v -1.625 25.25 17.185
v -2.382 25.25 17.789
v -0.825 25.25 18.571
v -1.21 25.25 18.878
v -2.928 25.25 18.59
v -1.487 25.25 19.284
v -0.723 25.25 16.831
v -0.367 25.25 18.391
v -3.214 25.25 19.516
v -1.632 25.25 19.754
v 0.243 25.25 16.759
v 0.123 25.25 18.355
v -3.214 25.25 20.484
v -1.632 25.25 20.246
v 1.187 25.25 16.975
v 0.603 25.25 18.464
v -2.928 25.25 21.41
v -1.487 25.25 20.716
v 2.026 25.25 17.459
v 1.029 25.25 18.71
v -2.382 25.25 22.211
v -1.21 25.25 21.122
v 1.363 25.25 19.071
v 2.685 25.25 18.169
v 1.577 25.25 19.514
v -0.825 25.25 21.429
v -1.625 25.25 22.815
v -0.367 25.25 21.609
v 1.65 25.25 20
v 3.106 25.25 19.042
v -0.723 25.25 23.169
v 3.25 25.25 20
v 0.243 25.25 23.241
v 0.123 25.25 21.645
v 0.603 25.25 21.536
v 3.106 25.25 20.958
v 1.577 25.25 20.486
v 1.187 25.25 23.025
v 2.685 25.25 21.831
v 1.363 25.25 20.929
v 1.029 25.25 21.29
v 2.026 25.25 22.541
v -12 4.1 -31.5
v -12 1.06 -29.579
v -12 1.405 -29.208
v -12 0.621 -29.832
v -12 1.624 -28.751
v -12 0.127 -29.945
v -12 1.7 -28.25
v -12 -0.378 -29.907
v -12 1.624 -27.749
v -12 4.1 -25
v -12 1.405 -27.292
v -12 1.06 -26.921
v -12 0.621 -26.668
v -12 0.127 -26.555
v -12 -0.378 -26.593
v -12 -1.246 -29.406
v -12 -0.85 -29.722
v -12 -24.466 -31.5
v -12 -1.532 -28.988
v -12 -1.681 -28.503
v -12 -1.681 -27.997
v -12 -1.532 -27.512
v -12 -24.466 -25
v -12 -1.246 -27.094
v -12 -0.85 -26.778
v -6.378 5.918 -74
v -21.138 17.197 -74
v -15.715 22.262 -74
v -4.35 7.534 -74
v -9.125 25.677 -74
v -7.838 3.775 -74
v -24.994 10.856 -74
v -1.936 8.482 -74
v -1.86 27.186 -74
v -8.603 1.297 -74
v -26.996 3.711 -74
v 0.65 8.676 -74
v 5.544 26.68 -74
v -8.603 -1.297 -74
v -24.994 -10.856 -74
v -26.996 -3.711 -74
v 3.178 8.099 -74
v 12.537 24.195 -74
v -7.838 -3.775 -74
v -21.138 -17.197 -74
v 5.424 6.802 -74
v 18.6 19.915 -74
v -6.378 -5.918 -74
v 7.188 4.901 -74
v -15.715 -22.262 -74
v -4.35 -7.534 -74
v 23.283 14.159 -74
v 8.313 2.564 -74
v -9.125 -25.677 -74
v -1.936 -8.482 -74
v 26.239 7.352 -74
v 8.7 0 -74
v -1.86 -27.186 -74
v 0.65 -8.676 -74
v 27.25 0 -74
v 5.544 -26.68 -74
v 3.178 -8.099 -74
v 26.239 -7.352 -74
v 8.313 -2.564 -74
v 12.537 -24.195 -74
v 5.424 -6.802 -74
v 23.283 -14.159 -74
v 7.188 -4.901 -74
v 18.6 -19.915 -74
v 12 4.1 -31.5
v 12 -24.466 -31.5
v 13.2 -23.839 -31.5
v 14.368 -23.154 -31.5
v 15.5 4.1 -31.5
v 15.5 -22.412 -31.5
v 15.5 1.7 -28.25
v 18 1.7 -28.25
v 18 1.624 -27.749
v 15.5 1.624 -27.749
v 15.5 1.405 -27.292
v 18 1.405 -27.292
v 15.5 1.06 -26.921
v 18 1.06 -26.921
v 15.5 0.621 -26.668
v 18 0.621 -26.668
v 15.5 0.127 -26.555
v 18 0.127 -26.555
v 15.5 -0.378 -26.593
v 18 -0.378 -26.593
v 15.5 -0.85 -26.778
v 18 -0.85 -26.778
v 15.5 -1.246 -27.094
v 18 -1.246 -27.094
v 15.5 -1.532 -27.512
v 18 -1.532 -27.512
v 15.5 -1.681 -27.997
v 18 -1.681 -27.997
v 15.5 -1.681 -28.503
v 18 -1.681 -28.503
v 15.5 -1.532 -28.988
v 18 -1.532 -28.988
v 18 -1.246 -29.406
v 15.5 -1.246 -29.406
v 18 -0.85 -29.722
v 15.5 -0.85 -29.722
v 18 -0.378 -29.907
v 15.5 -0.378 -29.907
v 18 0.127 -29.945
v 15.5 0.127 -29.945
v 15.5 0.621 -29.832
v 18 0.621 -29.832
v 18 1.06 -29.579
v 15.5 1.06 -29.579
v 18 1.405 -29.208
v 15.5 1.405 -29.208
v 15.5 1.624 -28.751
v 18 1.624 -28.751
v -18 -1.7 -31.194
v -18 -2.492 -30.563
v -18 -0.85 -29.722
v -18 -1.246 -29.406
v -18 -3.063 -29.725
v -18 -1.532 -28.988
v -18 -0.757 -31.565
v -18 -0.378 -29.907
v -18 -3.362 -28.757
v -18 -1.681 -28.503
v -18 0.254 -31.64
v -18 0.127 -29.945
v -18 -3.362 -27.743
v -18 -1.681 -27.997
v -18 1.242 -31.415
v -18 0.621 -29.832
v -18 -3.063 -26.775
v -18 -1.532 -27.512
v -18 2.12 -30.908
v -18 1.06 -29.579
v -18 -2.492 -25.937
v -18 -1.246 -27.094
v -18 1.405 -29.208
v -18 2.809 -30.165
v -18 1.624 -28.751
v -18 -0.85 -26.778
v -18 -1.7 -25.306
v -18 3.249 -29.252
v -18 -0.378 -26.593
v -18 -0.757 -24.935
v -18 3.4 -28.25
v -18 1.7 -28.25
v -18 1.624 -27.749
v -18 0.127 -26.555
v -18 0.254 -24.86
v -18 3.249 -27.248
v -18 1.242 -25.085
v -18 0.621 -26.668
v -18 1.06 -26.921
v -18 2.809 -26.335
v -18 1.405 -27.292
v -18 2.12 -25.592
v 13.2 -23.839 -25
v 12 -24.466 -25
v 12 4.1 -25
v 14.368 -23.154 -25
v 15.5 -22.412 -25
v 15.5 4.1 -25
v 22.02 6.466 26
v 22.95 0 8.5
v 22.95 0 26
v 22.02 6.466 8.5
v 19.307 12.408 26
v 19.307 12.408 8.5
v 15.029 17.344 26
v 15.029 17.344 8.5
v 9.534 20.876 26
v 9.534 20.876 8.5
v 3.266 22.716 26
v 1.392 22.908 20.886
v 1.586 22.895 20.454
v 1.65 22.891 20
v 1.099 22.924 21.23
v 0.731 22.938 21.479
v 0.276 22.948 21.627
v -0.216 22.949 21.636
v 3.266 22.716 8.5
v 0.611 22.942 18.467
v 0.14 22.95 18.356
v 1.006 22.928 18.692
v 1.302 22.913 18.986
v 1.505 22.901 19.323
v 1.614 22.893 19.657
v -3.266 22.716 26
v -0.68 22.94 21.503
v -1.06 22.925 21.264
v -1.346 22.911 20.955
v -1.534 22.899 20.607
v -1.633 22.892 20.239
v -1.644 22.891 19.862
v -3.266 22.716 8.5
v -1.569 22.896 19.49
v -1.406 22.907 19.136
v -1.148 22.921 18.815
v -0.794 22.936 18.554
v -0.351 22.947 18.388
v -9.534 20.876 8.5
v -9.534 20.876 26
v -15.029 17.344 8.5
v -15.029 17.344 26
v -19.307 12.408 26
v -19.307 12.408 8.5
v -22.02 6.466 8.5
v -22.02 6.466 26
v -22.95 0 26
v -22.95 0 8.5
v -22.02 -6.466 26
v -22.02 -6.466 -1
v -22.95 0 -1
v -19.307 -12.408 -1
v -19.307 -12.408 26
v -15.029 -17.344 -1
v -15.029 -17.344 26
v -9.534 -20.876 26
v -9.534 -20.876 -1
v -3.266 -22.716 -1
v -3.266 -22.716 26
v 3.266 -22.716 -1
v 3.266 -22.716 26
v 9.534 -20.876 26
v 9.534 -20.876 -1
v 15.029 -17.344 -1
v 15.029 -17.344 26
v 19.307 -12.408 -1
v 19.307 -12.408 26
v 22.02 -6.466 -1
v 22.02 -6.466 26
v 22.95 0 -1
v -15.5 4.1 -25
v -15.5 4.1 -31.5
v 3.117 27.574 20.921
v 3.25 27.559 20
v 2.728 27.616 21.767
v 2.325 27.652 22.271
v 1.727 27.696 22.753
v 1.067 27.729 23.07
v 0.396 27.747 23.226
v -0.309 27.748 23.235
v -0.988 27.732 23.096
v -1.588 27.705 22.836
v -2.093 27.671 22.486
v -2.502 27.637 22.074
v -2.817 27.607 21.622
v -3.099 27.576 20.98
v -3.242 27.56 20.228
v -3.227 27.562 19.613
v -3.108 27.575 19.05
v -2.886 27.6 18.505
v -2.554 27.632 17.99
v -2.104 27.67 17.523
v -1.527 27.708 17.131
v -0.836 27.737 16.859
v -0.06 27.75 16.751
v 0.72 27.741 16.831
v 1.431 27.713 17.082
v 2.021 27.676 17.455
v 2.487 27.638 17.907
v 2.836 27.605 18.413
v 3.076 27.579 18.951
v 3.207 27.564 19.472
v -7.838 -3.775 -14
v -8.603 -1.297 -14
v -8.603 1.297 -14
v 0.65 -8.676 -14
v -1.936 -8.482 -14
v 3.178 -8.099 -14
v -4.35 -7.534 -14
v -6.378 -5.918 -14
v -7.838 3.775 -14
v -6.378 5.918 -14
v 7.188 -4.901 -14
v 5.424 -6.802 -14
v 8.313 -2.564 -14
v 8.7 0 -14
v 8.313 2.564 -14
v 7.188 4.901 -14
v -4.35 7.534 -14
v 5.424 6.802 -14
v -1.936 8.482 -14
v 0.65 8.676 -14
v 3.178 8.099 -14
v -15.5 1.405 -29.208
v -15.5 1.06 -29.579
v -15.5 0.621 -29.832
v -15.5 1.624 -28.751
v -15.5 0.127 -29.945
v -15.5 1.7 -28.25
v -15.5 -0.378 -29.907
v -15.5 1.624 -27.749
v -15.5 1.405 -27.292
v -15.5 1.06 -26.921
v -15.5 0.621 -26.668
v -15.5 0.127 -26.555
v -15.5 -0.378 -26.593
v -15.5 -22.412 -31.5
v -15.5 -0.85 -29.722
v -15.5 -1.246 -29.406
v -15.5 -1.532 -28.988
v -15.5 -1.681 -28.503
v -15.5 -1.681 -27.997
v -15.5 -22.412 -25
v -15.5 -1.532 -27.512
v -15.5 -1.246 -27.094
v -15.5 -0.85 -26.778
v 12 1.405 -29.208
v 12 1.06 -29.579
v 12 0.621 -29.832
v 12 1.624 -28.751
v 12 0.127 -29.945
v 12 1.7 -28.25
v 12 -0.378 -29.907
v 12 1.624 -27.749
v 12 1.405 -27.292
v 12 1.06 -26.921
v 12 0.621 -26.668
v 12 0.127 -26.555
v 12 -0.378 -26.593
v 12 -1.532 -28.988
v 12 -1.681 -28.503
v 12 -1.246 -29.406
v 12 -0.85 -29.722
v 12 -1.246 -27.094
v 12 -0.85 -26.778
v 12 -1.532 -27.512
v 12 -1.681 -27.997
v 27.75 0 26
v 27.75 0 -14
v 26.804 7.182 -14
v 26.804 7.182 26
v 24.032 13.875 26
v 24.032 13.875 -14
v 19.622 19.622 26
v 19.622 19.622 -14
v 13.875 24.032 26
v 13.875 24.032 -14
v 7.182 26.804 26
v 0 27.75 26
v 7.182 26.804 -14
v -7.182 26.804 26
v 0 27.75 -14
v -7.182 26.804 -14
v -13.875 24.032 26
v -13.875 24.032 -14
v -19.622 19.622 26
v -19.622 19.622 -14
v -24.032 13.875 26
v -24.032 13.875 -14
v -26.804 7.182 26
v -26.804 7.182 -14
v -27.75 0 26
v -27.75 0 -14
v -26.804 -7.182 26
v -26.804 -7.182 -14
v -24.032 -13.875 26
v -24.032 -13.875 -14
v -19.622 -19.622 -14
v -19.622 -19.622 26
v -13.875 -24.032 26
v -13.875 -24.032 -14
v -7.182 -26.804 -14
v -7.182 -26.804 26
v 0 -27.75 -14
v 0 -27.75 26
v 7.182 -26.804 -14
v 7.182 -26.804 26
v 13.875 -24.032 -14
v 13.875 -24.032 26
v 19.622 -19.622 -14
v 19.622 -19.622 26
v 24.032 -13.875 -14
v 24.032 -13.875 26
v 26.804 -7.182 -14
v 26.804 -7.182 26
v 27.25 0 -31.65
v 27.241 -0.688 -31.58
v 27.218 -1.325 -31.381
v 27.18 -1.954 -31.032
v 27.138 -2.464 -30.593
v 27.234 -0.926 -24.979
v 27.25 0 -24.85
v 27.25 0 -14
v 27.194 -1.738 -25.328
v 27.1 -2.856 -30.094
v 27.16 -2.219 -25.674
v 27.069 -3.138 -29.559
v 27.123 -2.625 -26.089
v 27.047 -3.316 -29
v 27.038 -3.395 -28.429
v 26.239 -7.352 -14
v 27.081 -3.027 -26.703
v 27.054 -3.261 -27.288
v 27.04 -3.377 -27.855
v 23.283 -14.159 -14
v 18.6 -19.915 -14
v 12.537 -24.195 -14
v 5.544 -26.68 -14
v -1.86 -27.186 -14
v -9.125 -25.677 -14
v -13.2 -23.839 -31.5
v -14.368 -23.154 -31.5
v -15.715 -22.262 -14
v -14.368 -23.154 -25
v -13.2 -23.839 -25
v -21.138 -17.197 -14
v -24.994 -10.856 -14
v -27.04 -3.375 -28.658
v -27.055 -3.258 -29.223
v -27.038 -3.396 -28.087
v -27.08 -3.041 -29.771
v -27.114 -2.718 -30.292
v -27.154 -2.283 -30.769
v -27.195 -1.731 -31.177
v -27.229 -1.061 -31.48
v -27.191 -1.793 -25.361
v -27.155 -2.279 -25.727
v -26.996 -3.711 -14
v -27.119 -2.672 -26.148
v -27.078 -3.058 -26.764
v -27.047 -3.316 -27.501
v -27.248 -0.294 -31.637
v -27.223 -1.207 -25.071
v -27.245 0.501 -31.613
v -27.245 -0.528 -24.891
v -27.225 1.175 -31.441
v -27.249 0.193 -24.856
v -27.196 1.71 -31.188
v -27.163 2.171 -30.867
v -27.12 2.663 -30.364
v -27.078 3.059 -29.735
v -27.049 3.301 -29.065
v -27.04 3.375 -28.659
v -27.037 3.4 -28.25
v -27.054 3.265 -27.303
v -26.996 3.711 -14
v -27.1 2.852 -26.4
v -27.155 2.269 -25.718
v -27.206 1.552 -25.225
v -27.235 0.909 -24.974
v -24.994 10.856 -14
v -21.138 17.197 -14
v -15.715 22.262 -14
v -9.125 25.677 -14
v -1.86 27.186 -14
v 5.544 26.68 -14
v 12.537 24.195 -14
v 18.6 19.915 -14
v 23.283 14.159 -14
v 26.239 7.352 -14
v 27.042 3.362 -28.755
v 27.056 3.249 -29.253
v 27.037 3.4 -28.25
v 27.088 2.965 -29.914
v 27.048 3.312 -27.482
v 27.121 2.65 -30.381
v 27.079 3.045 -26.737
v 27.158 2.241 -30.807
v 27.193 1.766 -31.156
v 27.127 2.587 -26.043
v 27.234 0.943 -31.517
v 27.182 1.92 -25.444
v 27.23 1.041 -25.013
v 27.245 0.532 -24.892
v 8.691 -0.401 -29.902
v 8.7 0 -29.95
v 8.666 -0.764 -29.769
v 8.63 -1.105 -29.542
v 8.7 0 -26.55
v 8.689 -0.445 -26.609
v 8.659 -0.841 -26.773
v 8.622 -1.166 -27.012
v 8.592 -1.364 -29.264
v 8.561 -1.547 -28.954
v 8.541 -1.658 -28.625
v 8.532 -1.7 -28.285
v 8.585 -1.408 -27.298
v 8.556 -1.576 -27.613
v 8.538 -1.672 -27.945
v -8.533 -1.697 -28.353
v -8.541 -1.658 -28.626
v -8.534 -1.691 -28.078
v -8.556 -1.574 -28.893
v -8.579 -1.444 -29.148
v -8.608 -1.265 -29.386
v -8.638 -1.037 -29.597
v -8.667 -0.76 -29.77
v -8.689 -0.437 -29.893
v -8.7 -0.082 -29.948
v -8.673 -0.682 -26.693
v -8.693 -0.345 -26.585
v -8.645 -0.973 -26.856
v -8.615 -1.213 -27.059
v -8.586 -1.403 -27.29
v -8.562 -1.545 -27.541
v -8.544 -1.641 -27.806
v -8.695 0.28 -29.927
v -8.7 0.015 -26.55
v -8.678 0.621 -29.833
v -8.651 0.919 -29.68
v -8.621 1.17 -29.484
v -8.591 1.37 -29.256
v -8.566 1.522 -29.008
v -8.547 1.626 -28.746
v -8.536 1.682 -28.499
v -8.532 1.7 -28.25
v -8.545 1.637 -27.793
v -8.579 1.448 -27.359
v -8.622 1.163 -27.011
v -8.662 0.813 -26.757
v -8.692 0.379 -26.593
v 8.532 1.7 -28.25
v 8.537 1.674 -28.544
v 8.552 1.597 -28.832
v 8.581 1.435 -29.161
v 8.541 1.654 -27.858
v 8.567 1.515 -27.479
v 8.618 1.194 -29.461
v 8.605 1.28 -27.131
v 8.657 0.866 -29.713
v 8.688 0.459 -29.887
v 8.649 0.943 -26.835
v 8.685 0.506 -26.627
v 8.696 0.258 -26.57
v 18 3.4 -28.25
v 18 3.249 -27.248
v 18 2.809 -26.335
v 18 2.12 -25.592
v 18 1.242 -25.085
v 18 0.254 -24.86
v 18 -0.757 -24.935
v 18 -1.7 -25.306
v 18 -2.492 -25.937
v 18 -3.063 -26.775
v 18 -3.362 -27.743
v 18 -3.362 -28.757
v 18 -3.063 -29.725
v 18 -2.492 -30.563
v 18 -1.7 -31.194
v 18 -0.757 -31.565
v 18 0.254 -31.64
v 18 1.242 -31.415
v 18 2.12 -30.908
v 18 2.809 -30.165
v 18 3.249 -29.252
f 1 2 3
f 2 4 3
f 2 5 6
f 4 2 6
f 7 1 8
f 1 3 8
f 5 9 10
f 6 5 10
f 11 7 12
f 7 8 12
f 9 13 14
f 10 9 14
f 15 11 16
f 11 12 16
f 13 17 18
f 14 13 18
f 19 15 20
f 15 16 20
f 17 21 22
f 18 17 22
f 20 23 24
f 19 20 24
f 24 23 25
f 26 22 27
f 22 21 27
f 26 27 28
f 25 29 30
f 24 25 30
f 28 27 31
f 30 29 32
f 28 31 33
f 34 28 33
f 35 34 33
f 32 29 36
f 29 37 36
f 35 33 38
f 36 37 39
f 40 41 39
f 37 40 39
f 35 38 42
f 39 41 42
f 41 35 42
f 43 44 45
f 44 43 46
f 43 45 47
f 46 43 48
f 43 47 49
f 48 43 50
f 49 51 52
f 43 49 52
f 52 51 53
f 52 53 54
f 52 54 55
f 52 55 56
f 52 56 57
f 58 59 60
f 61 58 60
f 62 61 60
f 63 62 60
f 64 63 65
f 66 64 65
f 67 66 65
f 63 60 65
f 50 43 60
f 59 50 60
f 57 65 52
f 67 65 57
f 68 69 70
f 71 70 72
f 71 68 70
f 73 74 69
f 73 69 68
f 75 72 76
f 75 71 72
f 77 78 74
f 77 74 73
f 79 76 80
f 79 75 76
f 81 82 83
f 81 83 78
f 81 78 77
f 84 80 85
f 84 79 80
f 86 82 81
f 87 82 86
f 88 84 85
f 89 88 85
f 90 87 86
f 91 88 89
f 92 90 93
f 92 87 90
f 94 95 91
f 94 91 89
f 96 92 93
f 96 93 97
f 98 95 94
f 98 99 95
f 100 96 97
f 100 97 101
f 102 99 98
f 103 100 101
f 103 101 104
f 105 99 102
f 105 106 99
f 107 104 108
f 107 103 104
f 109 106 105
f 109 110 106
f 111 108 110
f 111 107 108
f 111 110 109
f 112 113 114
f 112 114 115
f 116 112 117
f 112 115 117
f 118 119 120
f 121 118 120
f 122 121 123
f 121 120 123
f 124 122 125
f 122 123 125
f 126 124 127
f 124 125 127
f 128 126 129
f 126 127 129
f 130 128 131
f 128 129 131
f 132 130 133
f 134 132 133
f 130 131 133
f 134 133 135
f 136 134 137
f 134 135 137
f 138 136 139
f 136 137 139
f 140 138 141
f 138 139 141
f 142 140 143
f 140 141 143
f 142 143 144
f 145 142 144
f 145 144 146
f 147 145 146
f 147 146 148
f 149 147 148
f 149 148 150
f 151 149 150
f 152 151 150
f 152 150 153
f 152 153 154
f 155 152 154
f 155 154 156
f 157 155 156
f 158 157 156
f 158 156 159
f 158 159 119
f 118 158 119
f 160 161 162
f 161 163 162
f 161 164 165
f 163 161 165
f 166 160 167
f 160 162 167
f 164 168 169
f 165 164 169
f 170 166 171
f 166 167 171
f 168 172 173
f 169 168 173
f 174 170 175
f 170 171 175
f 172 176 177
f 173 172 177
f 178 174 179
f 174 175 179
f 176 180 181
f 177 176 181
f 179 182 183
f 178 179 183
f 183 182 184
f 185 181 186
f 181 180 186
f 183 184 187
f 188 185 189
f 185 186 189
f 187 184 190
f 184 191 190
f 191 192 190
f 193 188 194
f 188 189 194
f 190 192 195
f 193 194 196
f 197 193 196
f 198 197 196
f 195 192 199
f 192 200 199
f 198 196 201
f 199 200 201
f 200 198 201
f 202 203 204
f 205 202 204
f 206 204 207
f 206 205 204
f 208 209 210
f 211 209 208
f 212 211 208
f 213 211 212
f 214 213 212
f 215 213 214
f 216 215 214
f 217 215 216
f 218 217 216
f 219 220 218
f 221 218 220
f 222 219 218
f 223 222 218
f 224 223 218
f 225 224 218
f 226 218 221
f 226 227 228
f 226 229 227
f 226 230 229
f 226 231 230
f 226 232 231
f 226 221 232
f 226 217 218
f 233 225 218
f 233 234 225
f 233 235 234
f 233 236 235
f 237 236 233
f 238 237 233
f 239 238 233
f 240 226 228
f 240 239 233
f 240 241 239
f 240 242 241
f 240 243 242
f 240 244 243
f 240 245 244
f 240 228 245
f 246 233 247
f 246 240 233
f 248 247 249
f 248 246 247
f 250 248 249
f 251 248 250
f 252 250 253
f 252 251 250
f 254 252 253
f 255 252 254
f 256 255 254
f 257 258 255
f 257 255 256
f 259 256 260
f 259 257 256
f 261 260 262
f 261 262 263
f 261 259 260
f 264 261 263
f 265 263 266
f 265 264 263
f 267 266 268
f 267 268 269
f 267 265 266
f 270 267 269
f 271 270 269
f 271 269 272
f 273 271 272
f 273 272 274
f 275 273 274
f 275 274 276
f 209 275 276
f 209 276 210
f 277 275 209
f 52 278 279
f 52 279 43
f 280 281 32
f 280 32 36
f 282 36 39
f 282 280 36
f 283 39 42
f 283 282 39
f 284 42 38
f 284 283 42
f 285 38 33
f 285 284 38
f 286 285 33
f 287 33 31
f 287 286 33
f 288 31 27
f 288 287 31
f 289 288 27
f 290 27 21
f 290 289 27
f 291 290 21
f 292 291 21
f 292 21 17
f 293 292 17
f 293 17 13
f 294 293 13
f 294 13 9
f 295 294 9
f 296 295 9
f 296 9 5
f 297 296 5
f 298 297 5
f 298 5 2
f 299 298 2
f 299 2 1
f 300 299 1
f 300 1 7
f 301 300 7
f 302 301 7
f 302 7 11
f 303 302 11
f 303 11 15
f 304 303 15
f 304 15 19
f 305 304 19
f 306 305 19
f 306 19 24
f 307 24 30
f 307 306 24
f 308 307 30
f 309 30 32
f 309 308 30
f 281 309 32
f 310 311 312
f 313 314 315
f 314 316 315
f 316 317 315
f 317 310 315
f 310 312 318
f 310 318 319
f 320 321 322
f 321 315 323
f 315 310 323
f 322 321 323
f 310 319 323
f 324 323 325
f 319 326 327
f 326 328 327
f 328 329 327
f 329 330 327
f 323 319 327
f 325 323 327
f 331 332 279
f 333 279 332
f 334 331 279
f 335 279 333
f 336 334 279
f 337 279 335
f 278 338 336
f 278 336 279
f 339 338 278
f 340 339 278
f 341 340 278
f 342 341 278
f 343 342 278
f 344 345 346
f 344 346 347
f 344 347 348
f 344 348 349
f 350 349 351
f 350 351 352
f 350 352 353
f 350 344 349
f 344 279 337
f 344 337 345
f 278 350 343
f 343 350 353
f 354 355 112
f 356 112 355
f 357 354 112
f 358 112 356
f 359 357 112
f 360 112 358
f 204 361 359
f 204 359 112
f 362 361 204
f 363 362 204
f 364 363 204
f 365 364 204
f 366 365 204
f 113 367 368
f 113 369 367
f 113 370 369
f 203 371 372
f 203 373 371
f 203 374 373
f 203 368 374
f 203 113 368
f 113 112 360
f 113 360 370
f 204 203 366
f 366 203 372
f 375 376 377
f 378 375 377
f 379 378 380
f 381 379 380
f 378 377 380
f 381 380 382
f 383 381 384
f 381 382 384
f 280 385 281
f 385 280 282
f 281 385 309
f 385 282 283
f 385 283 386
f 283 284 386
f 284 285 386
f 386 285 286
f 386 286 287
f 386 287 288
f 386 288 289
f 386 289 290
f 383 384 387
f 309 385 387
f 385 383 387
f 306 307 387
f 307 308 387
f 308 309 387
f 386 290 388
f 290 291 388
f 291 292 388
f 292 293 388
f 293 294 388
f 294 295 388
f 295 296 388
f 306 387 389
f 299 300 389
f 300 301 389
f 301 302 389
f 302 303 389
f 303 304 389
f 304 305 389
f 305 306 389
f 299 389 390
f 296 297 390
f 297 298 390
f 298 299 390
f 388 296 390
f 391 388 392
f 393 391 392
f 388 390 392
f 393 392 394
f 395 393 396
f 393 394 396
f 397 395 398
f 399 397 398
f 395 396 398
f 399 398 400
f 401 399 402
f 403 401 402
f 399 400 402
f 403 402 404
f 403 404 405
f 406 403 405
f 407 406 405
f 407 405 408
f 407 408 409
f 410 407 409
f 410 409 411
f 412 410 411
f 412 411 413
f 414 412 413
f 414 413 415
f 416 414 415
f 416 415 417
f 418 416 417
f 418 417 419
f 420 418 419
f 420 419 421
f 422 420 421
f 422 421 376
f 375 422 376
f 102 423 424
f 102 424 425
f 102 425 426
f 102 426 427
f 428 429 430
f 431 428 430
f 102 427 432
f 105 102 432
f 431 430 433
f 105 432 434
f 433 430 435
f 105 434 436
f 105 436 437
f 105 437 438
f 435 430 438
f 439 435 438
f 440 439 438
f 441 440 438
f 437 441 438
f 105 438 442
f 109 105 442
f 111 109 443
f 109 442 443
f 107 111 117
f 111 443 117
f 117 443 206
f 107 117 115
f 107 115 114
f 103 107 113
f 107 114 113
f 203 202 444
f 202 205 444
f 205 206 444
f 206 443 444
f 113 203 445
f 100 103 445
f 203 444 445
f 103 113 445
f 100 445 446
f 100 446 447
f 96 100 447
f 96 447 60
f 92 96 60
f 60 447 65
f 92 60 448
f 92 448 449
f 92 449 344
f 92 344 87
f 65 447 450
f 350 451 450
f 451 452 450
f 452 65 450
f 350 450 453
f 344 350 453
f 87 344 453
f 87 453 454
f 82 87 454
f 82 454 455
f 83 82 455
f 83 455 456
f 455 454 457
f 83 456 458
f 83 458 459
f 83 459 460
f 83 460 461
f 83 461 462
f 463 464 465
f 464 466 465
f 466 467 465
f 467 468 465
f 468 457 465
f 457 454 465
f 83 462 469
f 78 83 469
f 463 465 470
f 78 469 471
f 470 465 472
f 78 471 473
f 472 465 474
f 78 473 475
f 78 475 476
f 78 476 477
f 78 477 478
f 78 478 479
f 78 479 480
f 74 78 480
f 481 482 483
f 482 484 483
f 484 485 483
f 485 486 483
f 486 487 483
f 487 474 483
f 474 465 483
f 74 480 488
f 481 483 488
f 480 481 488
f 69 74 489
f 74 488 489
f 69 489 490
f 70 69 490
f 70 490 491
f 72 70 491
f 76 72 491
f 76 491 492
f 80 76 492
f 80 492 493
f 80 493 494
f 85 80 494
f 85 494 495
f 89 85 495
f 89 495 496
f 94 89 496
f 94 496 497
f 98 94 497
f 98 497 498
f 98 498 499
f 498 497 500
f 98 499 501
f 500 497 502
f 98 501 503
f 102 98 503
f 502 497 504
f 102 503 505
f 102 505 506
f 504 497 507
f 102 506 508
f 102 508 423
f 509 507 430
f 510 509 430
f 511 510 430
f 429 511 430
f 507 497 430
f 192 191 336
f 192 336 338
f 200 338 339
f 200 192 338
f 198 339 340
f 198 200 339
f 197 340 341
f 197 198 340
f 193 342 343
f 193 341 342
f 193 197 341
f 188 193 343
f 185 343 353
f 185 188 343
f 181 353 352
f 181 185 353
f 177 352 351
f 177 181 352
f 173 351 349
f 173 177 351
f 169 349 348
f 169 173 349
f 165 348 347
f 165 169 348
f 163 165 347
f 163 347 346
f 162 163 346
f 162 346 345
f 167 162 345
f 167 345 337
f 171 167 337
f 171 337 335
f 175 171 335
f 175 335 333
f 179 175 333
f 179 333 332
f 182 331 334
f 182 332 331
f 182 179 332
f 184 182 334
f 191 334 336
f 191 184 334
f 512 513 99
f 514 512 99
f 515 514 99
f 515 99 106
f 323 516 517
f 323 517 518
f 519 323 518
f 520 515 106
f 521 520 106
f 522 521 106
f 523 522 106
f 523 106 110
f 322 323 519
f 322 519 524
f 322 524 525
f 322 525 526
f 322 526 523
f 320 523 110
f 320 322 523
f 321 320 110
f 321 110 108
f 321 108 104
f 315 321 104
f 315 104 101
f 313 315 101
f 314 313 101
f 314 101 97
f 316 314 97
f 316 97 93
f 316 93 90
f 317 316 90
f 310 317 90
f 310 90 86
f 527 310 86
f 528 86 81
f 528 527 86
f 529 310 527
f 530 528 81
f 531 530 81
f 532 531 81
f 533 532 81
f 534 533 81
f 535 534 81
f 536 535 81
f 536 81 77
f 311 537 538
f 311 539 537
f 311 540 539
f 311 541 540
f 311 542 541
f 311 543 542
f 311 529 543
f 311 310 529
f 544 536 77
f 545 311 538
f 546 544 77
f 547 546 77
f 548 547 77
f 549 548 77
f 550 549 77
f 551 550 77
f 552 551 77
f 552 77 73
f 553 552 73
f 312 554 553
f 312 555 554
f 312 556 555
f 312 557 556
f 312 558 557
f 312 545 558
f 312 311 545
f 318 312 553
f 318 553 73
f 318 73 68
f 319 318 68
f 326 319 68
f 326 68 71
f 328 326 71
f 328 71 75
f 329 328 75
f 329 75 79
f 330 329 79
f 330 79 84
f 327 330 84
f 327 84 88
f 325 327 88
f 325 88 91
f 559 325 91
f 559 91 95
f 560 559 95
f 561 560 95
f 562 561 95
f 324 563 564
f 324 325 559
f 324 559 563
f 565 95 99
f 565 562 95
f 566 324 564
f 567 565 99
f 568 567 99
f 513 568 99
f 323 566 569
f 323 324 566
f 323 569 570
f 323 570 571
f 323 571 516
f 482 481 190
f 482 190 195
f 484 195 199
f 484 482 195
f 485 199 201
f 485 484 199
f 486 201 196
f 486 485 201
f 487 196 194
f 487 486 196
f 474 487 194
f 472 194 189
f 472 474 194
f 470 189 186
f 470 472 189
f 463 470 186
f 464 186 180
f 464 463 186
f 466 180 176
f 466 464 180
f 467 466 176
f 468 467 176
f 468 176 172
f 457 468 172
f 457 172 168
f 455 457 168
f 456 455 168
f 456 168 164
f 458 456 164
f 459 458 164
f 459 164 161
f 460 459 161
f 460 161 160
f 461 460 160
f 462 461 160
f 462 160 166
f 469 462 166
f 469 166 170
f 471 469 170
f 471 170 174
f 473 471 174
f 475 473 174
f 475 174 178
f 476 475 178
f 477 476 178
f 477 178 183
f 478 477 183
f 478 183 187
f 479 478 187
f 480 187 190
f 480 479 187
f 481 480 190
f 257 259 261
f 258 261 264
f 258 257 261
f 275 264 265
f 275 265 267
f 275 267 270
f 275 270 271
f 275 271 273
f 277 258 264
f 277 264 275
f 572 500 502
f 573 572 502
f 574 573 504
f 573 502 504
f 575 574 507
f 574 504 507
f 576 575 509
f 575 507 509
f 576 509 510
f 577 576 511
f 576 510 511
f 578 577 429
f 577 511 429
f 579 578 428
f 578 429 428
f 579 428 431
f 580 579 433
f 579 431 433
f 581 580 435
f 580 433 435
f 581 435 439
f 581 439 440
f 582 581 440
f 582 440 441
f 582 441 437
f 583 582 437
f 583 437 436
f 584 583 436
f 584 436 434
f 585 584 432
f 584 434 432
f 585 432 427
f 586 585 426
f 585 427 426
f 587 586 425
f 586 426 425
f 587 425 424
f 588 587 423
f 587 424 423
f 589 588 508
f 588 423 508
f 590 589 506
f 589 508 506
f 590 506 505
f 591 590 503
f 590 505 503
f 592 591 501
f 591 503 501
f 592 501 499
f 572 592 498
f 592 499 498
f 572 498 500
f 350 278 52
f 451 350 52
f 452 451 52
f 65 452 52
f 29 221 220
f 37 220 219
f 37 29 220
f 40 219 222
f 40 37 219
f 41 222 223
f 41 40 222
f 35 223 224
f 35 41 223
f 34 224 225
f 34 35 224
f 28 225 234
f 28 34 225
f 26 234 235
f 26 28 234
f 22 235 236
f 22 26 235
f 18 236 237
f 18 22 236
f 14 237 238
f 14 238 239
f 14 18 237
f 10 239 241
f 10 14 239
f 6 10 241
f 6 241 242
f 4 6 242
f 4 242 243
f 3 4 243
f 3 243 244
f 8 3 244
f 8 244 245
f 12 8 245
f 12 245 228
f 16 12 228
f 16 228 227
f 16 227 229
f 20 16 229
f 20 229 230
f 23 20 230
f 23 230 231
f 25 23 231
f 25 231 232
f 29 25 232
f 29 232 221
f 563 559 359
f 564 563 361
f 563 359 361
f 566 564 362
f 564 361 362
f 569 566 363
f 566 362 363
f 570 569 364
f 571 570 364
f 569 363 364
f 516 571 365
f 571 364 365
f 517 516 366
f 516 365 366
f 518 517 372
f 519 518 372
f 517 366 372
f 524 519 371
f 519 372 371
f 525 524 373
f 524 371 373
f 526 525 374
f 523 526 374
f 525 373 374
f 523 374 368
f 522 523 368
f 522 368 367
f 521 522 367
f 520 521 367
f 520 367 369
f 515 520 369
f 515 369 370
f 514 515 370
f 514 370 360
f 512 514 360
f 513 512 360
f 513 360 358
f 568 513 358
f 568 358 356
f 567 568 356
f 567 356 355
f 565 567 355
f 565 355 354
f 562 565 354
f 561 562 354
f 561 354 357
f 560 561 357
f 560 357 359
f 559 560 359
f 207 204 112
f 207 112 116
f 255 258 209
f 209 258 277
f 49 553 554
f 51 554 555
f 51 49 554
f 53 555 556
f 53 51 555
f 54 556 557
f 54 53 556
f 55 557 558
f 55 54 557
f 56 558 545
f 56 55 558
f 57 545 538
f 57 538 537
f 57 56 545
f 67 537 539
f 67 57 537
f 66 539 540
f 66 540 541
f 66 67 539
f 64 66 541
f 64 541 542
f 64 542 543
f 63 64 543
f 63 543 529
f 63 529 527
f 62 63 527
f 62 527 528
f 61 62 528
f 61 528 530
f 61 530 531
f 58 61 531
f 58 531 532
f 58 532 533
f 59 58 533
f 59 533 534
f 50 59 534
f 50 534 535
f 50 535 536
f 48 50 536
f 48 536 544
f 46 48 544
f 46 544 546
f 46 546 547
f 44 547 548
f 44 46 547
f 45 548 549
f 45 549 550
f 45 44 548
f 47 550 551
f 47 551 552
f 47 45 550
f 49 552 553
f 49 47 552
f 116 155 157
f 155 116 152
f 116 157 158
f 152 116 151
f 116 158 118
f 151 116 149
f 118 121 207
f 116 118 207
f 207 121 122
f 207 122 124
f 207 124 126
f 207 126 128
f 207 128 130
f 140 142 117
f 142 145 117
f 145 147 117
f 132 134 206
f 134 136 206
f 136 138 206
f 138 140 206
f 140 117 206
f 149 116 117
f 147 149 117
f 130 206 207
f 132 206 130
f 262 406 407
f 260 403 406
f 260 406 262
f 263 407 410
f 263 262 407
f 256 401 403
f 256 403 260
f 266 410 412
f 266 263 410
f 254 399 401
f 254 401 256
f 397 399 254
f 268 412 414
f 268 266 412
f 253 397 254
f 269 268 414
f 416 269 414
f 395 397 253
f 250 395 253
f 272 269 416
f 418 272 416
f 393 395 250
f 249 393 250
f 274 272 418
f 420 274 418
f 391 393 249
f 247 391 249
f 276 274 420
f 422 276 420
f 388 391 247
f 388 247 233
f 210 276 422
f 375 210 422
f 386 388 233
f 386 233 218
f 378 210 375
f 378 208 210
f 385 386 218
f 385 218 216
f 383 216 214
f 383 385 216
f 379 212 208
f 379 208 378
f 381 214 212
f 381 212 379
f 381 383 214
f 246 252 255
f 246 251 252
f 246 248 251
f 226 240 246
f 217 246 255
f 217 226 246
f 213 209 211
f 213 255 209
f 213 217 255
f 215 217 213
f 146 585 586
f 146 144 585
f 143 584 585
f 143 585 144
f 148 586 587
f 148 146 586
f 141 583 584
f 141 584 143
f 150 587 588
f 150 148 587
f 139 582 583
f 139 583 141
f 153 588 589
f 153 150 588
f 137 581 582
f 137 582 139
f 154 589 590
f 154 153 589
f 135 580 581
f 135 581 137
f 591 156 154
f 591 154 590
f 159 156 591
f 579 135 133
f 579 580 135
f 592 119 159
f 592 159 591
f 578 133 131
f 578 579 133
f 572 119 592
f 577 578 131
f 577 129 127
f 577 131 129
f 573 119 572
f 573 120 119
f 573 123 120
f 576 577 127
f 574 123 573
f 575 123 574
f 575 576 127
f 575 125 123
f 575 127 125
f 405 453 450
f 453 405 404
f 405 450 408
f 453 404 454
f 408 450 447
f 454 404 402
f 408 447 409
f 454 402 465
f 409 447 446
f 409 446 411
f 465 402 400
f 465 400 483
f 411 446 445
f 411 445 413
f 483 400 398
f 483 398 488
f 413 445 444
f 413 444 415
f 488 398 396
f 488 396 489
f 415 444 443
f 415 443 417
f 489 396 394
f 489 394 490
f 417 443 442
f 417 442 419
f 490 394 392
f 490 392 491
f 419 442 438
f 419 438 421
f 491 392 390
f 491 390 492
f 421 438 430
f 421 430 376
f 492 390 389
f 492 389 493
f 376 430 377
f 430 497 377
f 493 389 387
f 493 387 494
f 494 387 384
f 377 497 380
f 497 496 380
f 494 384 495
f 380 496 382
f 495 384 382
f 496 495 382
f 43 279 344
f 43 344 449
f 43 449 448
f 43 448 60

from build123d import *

# Parameters (mm, degrees)
CYLINDER005_R     = 1.65
CYLINDER005_DEPTH = 50
CYLINDER006_R     = 3.25
CYLINDER006_DEPTH = 2.5
BOX001_W          = 80
BOX001_H          = 100
BOX001_DEPTH      = 9.5
CYLINDER003_R     = 22.95
CYLINDER003_DEPTH = 27
CYLINDER004_R     = 27.75
CYLINDER004_DEPTH = 40
SKETCH006_R       = 27.25
SKETCH006_R_2     = 8.7
PAD_DEPTH         = 60
SKETCH007_W       = 3.5
SKETCH007_H       = 6.5
POCKET007_DEPTH   = 32.1
SKETCH008_R       = 1.7
POCKET008_DEPTH   = 30
SKETCH009_R       = 3.4
POCKET009_DEPTH   = 10
SKETCH010_R       = 1.7
POCKET010_DEPTH   = 30
SKETCH011_R       = 3.4
POCKET011_DEPTH   = 10
SKETCH012_W       = 3.5
SKETCH012_H       = 6.5
POCKET012_DEPTH   = 32.1


with BuildPart() as cylinder:
    # Cylinder005 → Cylinder005 (new body)
    with BuildSketch(Plane(origin=(0, 50, 20), x_dir=(1, 0, 0), z_dir=(0, -1, 0))):
        Circle(CYLINDER005_R)
    extrude(amount=CYLINDER005_DEPTH)


with BuildPart() as cylinder006:
    # Cylinder006 → Cylinder006 (new body)
    with BuildSketch(Plane(origin=(0, 27.75, 20), x_dir=(1, 0, 0), z_dir=(0, -1, 0))):
        Circle(CYLINDER006_R)
    extrude(amount=CYLINDER006_DEPTH)


with BuildPart() as addcube:
    # Box001 → Box001 (new body)
    with BuildSketch(Plane(origin=(-40, 0, -1), x_dir=(1, 0, 0), z_dir=(0, 0, 1))):
        with Locations((40, 50)):
            Rectangle(BOX001_W, BOX001_H)
    extrude(amount=BOX001_DEPTH)


with BuildPart() as fusion003:
    # Cylinder003 → Cylinder003 (new body)
    with BuildSketch(Plane.XY.offset(-1)):
        Circle(CYLINDER003_R)
    extrude(amount=CYLINDER003_DEPTH)

    # Cut004: cut AddCube
    add(addcube.part, mode=Mode.SUBTRACT)

    # Fusion003: union Cylinder, Cylinder006
    add(cylinder.part)
    add(cylinder006.part)


with BuildPart() as mounttopole:
    # Cylinder004 → Cylinder004 (new body)
    with BuildSketch(Plane.XY.offset(-14)):
        Circle(CYLINDER004_R)
    extrude(amount=CYLINDER004_DEPTH)

    # Cut002: cut Fusion003
    add(fusion003.part, mode=Mode.SUBTRACT)

    # Sketch006 (on Face2 of BaseFeature002) → Pad (new body)
    with BuildSketch(Plane(origin=(0, 0, -14), x_dir=(1, 0, 0), z_dir=(0, 0, -1))):
        Circle(SKETCH006_R)
        Circle(SKETCH006_R_2, mode=Mode.SUBTRACT)
    extrude(amount=PAD_DEPTH)

    # Sketch007 → Pocket007 (cut)
    with BuildSketch(Plane.XZ.offset(28)):
        with Locations((13.75, -28.25)):
            Rectangle(SKETCH007_W, SKETCH007_H)
    extrude(amount=-POCKET007_DEPTH, mode=Mode.SUBTRACT)

    # Sketch008 → Pocket008 (cut)
    with BuildSketch(Plane.YZ.offset(28)):
        with Locations((0, -28.25)):
            Circle(SKETCH008_R)
    extrude(amount=-POCKET008_DEPTH, mode=Mode.SUBTRACT)

    # Sketch009 → Pocket009 (cut)
    with BuildSketch(Plane.YZ.offset(28)):
        with Locations((0, -28.25)):
            Circle(SKETCH009_R)
    extrude(amount=-POCKET009_DEPTH, mode=Mode.SUBTRACT)

    # Sketch010 → Pocket010 (cut)
    with BuildSketch(Plane.YZ.offset(-28)):
        with Locations((0, -28.25)):
            Circle(SKETCH010_R)
    extrude(amount=POCKET010_DEPTH, mode=Mode.SUBTRACT)

    # Sketch011 → Pocket011 (cut)
    with BuildSketch(Plane.YZ.offset(-28)):
        with Locations((0, -28.25)):
            Circle(SKETCH011_R)
    extrude(amount=POCKET011_DEPTH, mode=Mode.SUBTRACT)

    # Sketch012 → Pocket012 (cut)
    with BuildSketch(Plane(origin=(0, -28, 2), x_dir=(1, 0, 0), z_dir=(0, -1, 0))):
        with Locations((-13.75, -30.25)):
            Rectangle(SKETCH012_W, SKETCH012_H)
    extrude(amount=-POCKET012_DEPTH, mode=Mode.SUBTRACT)


solid = mounttopole.part
